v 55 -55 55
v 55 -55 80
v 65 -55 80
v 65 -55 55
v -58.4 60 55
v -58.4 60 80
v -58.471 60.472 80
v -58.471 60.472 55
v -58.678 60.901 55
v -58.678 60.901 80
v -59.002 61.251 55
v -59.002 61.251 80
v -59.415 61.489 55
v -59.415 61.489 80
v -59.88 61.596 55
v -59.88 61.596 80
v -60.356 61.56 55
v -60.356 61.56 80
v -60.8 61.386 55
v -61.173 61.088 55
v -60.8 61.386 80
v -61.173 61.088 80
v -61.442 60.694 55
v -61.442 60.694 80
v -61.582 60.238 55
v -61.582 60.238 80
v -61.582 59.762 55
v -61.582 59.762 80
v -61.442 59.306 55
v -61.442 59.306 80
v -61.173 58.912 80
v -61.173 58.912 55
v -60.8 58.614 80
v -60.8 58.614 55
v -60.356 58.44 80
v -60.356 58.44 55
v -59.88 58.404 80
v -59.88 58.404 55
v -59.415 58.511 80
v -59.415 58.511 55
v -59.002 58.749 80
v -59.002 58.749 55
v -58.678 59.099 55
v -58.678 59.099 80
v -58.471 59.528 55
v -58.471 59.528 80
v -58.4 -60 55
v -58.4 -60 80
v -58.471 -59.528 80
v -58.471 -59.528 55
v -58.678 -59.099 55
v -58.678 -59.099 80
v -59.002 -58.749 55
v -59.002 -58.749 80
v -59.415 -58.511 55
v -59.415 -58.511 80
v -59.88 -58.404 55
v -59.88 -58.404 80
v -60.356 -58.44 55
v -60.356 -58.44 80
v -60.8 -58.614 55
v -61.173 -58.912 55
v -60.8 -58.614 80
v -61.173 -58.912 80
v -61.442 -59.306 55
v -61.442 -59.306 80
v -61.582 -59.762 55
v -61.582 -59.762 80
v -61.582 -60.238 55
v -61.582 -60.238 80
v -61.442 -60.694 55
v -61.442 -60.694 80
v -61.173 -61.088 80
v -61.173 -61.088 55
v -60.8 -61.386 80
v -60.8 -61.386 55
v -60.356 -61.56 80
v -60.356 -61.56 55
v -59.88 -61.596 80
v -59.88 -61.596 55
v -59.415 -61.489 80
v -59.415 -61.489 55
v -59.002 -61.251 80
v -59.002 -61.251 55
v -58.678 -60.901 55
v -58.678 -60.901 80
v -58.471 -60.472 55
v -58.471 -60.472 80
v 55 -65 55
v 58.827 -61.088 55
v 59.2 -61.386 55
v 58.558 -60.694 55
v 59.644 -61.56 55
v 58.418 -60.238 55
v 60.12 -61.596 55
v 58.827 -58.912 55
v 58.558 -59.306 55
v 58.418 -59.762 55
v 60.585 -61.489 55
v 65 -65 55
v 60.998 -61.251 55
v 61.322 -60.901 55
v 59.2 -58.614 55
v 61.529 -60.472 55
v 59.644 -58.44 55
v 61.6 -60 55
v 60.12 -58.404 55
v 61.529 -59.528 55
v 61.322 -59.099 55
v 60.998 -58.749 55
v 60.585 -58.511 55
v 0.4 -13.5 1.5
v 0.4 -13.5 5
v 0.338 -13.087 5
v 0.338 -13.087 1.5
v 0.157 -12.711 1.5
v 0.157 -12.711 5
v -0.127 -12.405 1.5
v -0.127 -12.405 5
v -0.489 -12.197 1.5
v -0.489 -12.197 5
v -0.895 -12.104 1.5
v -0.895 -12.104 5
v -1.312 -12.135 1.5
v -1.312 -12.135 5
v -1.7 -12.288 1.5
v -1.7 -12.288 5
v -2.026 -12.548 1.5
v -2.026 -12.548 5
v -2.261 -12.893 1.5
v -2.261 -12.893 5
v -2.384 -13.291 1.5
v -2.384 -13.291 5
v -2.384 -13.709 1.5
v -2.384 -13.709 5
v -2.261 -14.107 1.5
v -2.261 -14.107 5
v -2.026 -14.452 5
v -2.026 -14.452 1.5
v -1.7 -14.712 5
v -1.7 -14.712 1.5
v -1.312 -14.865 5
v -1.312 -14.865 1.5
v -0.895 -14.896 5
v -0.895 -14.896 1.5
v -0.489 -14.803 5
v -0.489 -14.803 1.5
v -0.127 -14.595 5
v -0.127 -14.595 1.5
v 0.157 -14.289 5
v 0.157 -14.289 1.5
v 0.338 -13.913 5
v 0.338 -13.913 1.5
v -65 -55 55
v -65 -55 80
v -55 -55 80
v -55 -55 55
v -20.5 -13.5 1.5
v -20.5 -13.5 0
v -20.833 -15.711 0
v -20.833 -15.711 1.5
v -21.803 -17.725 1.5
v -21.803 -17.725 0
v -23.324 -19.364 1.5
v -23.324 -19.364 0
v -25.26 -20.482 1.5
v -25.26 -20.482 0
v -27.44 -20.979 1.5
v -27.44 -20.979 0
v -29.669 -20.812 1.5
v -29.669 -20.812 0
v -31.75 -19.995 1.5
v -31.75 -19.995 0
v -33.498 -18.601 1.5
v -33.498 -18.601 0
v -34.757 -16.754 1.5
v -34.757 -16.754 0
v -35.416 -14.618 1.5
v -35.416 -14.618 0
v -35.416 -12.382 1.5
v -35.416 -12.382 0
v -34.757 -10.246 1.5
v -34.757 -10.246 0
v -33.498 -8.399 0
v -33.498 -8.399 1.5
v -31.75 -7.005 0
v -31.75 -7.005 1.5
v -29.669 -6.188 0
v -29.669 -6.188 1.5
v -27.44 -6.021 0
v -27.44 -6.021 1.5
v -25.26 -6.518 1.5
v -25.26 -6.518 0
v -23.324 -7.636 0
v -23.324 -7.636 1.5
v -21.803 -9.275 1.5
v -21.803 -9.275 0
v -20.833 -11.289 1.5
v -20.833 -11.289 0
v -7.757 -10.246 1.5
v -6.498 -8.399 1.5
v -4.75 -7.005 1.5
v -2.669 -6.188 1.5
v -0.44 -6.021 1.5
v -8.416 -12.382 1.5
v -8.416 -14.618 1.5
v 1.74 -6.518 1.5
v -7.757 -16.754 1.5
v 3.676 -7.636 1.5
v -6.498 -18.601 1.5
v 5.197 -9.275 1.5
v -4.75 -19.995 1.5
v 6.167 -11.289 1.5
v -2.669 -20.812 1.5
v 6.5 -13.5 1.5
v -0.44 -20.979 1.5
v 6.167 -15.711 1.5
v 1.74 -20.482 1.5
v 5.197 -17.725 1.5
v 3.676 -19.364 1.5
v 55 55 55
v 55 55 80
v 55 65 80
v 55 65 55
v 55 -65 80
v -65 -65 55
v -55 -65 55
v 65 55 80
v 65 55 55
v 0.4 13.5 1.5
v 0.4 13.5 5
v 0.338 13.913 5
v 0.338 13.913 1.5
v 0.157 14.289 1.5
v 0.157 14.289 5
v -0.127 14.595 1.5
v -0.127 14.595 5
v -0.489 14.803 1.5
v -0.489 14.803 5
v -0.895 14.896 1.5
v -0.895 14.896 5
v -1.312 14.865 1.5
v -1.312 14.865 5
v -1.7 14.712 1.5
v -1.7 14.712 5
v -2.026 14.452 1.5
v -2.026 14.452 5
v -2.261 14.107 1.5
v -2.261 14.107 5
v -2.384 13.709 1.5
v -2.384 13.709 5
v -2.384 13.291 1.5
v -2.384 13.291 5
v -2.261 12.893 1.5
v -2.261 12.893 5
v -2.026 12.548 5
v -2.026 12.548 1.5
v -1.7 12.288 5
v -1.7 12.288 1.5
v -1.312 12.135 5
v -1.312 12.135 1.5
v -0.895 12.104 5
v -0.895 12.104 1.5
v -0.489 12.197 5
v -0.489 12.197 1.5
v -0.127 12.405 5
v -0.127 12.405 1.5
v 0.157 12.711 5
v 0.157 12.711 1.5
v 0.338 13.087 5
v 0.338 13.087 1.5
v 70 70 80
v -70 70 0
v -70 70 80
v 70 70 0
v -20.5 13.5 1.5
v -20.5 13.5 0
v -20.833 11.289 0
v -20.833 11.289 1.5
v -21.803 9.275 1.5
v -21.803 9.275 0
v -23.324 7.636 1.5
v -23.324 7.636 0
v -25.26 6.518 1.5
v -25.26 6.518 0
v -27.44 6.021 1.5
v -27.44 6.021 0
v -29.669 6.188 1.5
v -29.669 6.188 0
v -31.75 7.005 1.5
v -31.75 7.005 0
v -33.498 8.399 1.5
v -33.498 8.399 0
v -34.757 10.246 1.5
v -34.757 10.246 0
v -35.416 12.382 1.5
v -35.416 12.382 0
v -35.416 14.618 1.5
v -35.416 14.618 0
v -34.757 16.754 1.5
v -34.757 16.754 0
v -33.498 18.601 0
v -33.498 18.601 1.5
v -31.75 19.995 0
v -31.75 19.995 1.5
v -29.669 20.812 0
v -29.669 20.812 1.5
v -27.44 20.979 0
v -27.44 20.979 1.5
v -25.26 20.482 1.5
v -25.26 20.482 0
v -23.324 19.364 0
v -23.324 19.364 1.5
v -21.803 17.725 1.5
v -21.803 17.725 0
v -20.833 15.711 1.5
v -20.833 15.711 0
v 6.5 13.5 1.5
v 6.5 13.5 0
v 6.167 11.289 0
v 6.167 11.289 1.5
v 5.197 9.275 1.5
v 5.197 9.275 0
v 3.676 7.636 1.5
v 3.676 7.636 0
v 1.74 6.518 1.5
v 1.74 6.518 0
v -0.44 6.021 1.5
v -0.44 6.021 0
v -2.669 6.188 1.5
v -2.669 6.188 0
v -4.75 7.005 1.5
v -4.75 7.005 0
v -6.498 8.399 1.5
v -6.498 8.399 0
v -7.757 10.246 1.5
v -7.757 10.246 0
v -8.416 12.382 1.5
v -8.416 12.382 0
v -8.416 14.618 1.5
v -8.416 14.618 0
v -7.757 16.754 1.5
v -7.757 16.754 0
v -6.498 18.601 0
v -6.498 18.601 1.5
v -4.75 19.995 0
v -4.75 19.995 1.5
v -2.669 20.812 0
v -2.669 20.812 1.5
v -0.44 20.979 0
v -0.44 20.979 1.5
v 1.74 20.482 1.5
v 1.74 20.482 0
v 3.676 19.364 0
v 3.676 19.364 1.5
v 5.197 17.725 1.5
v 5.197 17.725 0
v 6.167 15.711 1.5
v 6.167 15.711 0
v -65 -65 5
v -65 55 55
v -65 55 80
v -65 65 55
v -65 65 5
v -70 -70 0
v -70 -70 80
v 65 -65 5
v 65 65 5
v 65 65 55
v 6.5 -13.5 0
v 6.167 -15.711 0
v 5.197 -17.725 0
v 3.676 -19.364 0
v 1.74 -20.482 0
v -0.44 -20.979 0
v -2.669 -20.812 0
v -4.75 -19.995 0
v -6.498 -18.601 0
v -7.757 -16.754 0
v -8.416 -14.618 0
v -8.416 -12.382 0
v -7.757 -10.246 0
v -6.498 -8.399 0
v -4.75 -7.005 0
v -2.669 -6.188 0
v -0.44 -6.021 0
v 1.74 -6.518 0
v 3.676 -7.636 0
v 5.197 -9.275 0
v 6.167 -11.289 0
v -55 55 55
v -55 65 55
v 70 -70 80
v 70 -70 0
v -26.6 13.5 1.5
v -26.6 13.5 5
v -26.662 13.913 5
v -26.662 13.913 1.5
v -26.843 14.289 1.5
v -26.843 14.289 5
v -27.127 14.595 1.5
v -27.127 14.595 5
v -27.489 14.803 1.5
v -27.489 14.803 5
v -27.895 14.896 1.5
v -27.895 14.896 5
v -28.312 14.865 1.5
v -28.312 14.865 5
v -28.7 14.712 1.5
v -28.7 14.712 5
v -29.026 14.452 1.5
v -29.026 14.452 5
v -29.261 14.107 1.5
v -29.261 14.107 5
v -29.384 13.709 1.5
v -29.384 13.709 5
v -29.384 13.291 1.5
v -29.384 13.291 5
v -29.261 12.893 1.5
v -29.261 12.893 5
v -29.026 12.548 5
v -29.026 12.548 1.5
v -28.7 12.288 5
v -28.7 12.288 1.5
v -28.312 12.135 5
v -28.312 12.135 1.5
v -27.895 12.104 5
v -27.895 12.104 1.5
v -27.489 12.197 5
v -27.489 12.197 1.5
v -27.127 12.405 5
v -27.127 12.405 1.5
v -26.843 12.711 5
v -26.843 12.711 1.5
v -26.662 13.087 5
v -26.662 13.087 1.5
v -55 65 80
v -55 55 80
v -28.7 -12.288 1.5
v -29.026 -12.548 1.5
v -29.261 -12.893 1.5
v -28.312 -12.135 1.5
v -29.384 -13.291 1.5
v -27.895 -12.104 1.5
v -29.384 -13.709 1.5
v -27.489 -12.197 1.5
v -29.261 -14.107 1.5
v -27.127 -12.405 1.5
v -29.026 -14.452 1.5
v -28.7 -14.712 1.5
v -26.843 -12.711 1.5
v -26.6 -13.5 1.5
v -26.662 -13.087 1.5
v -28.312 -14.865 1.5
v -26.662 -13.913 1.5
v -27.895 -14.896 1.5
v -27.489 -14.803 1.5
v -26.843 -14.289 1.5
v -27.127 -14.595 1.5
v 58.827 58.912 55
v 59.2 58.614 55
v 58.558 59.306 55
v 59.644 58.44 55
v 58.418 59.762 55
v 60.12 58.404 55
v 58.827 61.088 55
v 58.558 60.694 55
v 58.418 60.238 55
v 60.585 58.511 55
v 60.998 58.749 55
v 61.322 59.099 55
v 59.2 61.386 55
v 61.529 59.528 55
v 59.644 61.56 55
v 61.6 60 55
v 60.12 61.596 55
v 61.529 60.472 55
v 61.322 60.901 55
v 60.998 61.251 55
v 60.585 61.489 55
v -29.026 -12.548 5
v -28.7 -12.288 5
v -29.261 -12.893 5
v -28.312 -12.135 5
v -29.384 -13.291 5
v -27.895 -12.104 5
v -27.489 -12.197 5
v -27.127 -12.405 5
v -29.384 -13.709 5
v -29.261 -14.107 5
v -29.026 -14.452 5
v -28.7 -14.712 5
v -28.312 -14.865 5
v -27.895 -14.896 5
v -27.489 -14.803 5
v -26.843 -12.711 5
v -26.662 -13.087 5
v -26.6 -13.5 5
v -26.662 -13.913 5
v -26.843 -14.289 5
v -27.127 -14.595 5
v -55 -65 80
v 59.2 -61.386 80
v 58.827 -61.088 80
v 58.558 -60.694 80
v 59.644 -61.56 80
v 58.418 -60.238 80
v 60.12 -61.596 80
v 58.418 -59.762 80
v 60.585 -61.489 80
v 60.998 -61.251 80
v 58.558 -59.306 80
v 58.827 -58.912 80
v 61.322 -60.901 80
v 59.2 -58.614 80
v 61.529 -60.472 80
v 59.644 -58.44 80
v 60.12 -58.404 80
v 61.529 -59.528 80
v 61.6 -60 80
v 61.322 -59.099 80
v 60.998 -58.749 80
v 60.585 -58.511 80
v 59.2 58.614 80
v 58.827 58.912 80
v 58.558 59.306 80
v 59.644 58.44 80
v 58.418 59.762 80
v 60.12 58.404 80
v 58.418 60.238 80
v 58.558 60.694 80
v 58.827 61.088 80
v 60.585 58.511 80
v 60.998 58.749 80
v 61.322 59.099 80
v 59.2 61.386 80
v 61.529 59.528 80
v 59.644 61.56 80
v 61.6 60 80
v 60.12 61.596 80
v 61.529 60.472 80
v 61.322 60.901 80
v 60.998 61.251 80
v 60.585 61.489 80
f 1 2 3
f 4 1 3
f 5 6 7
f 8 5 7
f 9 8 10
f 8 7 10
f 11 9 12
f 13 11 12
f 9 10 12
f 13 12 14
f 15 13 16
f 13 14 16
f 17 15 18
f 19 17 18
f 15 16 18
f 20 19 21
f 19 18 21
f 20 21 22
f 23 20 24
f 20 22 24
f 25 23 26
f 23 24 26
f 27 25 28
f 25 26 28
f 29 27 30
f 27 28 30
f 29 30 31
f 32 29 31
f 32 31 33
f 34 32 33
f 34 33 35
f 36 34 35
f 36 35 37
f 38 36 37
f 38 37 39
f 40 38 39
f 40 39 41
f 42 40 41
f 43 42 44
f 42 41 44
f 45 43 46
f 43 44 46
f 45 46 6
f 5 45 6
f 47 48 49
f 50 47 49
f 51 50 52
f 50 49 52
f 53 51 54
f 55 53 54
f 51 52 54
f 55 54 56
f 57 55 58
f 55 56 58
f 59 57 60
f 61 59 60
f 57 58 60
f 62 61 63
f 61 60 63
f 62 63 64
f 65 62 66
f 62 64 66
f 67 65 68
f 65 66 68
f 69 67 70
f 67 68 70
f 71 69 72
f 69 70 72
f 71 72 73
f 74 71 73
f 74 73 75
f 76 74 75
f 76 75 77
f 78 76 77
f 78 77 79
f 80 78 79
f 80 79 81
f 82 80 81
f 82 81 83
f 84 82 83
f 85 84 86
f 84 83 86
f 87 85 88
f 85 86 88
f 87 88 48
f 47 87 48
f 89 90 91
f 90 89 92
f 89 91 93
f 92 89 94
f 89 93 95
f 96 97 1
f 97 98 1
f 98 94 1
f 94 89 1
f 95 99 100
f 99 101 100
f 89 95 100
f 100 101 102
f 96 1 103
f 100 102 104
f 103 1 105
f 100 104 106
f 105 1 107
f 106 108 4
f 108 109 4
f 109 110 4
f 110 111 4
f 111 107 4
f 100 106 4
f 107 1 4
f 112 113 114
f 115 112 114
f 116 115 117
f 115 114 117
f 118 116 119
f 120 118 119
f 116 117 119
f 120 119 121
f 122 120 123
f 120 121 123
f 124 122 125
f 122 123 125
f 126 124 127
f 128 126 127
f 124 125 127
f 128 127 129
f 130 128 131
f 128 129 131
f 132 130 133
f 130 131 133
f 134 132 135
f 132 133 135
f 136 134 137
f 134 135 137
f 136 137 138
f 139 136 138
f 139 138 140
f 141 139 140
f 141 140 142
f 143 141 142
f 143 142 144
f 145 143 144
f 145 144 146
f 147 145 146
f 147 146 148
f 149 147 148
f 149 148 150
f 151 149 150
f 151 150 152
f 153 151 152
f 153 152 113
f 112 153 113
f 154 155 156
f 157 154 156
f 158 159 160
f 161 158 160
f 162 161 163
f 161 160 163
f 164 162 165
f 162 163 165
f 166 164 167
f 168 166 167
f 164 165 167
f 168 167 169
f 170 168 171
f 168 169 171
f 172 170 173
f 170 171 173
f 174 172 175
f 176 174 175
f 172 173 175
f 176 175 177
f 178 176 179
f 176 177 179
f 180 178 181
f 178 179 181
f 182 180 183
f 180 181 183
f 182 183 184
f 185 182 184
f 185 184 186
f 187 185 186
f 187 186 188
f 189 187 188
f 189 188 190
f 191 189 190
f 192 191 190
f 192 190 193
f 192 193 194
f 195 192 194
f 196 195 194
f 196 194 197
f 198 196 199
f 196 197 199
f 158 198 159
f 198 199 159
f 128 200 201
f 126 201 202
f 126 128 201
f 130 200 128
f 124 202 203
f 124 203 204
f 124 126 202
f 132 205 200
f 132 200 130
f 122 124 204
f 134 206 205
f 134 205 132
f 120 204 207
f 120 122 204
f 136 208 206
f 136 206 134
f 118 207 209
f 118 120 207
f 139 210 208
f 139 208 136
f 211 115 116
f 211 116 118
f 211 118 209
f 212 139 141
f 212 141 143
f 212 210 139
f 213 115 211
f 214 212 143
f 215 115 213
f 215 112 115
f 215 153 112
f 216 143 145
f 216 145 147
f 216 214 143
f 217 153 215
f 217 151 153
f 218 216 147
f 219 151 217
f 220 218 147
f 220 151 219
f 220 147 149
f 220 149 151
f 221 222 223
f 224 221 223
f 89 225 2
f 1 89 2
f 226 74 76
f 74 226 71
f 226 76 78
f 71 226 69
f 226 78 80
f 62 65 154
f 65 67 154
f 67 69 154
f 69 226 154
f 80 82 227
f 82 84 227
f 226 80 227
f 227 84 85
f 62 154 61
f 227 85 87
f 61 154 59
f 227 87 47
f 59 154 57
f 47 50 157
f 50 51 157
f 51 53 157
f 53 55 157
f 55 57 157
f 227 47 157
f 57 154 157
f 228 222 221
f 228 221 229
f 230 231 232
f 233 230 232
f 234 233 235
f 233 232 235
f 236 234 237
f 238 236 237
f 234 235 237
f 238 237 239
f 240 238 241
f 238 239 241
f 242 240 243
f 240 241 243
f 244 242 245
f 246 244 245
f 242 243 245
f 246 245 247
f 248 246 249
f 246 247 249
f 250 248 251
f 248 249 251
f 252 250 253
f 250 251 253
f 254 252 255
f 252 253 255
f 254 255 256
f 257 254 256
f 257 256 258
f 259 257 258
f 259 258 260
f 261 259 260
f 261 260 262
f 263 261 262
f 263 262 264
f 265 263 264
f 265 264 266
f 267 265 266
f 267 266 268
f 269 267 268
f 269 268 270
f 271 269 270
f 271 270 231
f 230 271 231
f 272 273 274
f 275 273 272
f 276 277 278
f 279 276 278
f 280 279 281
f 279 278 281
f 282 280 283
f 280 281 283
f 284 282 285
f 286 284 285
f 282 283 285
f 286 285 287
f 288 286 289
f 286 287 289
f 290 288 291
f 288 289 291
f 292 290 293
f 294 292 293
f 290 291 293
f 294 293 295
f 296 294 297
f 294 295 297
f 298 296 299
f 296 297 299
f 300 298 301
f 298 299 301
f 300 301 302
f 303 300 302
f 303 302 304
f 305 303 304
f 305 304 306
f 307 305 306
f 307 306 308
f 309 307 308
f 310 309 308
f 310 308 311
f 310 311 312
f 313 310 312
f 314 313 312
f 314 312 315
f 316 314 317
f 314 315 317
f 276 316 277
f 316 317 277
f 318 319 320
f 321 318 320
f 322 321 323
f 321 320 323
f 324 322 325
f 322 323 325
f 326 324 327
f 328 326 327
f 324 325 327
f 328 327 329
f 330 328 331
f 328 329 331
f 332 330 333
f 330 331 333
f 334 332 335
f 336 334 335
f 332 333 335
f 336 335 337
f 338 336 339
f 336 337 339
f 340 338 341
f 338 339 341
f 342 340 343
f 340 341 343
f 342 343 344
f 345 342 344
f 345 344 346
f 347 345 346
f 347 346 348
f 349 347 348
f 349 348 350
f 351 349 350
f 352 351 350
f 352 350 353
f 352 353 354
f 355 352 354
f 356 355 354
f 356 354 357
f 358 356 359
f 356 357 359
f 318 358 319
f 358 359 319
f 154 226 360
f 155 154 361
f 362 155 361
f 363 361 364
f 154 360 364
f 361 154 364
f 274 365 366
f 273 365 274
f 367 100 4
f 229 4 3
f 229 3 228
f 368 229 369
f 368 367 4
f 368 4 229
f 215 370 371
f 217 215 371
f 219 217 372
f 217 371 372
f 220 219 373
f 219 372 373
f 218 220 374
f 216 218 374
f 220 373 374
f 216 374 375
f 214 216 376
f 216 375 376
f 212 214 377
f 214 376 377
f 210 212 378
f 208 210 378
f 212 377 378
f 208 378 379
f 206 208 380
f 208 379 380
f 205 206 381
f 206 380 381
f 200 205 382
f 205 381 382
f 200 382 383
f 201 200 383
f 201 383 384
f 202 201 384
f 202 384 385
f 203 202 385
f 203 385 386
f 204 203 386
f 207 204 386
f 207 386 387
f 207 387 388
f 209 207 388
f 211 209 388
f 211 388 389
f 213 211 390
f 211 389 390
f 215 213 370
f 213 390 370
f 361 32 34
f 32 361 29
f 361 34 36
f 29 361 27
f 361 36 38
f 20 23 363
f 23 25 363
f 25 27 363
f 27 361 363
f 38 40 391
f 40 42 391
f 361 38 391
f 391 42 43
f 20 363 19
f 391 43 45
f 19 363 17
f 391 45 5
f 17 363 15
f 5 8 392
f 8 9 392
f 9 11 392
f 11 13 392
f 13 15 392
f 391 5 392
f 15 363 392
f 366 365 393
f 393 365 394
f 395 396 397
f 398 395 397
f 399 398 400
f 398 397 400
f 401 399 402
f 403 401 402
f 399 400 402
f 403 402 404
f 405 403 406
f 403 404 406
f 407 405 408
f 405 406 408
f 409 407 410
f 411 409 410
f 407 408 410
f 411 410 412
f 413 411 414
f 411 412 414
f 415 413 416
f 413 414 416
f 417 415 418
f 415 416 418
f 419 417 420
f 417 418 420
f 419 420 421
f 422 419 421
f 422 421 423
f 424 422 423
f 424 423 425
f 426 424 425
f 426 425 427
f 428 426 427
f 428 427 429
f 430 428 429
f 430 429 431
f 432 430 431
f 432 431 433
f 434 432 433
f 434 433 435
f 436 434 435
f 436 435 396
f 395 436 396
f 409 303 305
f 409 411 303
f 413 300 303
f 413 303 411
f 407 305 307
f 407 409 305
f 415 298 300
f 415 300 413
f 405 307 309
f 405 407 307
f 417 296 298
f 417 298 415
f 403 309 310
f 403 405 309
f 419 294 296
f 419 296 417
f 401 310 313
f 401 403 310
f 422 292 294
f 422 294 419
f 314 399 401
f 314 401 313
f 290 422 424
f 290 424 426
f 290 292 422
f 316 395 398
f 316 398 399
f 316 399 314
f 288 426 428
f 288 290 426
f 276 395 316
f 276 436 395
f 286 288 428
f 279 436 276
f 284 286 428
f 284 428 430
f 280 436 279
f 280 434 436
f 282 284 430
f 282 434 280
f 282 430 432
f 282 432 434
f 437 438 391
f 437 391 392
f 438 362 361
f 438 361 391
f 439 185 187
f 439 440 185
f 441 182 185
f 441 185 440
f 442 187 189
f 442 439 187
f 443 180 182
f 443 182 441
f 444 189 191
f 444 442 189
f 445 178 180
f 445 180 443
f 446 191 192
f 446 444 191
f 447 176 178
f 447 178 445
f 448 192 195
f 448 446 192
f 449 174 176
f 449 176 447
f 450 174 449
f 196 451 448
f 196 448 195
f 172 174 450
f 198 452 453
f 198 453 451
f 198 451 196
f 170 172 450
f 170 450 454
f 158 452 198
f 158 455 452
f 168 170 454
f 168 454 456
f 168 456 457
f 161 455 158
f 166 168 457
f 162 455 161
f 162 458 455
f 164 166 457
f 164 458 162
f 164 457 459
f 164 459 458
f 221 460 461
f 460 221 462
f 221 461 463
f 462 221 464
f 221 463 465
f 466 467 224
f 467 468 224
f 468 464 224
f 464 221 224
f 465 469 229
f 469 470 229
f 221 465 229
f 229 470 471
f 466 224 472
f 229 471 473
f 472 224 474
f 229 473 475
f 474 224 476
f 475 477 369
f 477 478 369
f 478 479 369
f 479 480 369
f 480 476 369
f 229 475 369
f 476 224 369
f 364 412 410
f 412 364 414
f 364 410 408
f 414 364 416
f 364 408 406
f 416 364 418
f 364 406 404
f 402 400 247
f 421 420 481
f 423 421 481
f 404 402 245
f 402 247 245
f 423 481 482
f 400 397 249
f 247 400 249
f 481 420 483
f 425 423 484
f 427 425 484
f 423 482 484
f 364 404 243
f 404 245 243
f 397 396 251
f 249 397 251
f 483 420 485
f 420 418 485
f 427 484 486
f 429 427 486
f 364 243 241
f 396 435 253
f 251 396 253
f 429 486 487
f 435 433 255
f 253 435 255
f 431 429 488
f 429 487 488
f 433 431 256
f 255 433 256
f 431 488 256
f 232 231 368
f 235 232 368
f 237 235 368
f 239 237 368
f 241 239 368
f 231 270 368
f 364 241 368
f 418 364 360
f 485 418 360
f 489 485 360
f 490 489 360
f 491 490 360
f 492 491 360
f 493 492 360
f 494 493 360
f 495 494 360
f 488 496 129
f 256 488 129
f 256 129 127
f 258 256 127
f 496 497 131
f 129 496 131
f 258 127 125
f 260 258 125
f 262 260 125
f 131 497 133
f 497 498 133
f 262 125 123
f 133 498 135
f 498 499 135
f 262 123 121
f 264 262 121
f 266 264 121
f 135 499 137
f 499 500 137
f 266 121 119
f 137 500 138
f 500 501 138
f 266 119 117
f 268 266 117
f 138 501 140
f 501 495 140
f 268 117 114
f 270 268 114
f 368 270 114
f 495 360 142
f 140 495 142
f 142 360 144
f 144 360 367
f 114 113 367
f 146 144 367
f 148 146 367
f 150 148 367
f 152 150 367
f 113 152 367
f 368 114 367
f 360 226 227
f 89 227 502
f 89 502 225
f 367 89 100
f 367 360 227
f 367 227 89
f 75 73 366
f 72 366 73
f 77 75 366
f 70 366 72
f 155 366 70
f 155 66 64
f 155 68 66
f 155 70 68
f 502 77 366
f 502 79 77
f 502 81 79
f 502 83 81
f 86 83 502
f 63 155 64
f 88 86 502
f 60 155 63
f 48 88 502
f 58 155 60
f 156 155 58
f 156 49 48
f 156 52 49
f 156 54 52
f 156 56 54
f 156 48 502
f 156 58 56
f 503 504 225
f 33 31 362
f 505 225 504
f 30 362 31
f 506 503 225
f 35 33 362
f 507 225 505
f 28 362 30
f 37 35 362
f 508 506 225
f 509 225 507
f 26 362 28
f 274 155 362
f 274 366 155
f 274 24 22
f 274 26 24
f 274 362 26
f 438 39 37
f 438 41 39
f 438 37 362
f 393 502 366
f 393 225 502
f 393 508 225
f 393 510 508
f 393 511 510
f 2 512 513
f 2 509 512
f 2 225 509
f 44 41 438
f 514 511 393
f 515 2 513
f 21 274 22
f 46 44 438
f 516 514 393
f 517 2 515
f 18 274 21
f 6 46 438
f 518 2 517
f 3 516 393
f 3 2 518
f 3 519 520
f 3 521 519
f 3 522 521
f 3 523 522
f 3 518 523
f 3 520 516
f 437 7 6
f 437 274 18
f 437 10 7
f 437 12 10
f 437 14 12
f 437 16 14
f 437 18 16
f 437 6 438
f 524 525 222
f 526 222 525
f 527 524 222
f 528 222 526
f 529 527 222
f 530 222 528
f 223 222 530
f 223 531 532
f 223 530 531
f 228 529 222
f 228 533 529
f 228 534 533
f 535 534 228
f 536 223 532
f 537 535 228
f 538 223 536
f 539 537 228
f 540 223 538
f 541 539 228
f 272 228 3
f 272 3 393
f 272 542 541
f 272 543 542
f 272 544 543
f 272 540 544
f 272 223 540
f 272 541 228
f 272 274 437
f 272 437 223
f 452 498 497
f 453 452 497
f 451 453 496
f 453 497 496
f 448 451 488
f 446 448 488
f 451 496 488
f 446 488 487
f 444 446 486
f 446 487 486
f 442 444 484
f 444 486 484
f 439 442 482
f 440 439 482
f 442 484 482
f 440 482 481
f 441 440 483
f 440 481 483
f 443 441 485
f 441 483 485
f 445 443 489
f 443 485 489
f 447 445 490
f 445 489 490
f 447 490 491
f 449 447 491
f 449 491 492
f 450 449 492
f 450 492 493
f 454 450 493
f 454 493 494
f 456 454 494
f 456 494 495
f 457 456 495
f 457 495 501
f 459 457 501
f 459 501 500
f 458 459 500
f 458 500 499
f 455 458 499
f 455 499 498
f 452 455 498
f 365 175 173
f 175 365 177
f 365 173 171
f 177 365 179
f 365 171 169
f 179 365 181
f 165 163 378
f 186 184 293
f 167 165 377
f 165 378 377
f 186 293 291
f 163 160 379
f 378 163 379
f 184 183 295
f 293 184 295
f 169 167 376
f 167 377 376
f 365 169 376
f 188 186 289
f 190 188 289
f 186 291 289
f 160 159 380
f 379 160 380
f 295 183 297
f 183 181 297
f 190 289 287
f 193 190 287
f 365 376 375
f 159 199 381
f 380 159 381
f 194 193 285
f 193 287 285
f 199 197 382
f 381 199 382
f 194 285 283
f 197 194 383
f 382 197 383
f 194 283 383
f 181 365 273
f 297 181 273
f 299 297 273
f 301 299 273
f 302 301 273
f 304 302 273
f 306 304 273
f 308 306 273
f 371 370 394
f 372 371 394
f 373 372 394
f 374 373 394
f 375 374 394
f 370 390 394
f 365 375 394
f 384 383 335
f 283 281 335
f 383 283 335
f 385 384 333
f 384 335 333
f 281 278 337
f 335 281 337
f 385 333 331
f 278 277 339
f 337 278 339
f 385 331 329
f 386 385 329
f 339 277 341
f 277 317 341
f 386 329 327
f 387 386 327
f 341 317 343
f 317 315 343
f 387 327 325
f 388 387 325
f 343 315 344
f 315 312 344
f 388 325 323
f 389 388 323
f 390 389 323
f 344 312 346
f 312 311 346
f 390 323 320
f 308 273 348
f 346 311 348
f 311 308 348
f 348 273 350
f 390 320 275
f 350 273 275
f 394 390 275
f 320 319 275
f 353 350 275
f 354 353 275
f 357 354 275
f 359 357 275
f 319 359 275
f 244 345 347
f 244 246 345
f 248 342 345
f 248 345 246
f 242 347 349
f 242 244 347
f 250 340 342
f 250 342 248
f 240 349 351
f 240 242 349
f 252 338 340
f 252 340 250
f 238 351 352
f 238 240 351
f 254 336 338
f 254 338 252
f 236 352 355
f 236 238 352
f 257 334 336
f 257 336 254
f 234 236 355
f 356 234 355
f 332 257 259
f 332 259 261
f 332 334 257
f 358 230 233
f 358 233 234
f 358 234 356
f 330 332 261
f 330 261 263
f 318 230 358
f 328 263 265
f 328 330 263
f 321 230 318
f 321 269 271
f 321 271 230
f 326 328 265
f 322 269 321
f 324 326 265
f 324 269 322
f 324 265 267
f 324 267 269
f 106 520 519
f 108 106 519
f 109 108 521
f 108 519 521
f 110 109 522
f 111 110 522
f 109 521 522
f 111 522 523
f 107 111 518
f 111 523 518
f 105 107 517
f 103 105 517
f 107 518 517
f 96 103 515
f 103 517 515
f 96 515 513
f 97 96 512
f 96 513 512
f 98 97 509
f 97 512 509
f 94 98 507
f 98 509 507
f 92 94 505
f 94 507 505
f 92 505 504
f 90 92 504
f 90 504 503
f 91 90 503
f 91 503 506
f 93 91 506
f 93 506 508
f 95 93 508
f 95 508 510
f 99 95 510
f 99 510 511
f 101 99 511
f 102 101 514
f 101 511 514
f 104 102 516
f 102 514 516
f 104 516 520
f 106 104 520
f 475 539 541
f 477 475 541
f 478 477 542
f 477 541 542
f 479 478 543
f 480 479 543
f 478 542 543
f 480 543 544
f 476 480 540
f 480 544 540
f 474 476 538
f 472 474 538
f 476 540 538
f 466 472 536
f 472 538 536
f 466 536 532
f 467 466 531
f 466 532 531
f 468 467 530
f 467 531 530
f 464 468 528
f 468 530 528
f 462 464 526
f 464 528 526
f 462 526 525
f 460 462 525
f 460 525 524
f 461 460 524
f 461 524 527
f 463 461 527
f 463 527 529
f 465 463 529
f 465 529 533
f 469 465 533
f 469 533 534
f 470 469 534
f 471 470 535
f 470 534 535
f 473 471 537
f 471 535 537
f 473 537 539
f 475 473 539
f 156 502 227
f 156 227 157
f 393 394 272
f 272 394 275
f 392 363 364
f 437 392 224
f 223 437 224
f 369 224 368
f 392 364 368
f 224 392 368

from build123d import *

# Parameters (mm, degrees)
F0_W     = 140
F0_H     = 140
F0_W_2   = 130
F0_H_2   = 130
F1_DEPTH = 80
F2_W     = 140
F2_H     = 140
F3_DEPTH = 5
F4_R     = 1.4
F5_DEPTH = 5
F6_R     = 7.5
F7_DEPTH = 1.5
F8_W     = 10
F8_H     = 10
F8_R     = 1.6
F9_DEPTH = 25


with BuildPart() as f1:
    # F0 (on Top) → F1 (new body)
    with BuildSketch(Plane.XY):
        Rectangle(F0_W, F0_H)
        Rectangle(F0_W_2, F0_H_2, mode=Mode.SUBTRACT)
    extrude(amount=F1_DEPTH)

    # F2 (on face) → F3 (join)
    with BuildSketch(Plane(origin=(0, 0, 0), x_dir=(1, 0, 0), z_dir=(0, 0, -1))):
        Rectangle(F2_W, F2_H)
    extrude(amount=-F3_DEPTH)

    # F4 (on face) → F5 (cut, through all)
    with BuildSketch(Plane.XY.offset(5)):
        with Locations((-1, 13.5)):
            Circle(F4_R)
        with Locations((-28, 13.5)):
            Circle(F4_R)
        with Locations((-1, -13.5)):
            Circle(F4_R)
        with Locations((-28, -13.5)):
            Circle(F4_R)
    extrude(amount=-F5_DEPTH, mode=Mode.SUBTRACT)

    # F6 (on face) → F7 (cut)
    with BuildSketch(Plane(origin=(0, 0, 0), x_dir=(1, 0, 0), z_dir=(0, 0, -1))):
        with Locations((-28, 13.5)):
            Circle(F6_R)
        with Locations((-1, 13.5)):
            Circle(F6_R)
        with Locations((-28, -13.5)):
            Circle(F6_R)
        with Locations((-1, -13.5)):
            Circle(F6_R)
    extrude(amount=-F7_DEPTH, mode=Mode.SUBTRACT)

    # F8 (on face) → F9 (join)
    with BuildSketch(Plane.XY.offset(80)):
        with Locations((-60, 60)):
            Rectangle(F8_W, F8_H)
        with Locations((-60, 60)):
            Circle(F8_R, mode=Mode.SUBTRACT)
        with Locations((60, 60)):
            Rectangle(F8_W, F8_H)
        with Locations((60, 60)):
            Circle(F8_R, mode=Mode.SUBTRACT)
        with Locations((-60, -60)):
            Rectangle(F8_W, F8_H)
        with Locations((-60, -60)):
            Circle(F8_R, mode=Mode.SUBTRACT)
        with Locations((60, -60)):
            Rectangle(F8_W, F8_H)
        with Locations((60, -60)):
            Circle(F8_R, mode=Mode.SUBTRACT)
    extrude(amount=-F9_DEPTH)


solid = f1.part
